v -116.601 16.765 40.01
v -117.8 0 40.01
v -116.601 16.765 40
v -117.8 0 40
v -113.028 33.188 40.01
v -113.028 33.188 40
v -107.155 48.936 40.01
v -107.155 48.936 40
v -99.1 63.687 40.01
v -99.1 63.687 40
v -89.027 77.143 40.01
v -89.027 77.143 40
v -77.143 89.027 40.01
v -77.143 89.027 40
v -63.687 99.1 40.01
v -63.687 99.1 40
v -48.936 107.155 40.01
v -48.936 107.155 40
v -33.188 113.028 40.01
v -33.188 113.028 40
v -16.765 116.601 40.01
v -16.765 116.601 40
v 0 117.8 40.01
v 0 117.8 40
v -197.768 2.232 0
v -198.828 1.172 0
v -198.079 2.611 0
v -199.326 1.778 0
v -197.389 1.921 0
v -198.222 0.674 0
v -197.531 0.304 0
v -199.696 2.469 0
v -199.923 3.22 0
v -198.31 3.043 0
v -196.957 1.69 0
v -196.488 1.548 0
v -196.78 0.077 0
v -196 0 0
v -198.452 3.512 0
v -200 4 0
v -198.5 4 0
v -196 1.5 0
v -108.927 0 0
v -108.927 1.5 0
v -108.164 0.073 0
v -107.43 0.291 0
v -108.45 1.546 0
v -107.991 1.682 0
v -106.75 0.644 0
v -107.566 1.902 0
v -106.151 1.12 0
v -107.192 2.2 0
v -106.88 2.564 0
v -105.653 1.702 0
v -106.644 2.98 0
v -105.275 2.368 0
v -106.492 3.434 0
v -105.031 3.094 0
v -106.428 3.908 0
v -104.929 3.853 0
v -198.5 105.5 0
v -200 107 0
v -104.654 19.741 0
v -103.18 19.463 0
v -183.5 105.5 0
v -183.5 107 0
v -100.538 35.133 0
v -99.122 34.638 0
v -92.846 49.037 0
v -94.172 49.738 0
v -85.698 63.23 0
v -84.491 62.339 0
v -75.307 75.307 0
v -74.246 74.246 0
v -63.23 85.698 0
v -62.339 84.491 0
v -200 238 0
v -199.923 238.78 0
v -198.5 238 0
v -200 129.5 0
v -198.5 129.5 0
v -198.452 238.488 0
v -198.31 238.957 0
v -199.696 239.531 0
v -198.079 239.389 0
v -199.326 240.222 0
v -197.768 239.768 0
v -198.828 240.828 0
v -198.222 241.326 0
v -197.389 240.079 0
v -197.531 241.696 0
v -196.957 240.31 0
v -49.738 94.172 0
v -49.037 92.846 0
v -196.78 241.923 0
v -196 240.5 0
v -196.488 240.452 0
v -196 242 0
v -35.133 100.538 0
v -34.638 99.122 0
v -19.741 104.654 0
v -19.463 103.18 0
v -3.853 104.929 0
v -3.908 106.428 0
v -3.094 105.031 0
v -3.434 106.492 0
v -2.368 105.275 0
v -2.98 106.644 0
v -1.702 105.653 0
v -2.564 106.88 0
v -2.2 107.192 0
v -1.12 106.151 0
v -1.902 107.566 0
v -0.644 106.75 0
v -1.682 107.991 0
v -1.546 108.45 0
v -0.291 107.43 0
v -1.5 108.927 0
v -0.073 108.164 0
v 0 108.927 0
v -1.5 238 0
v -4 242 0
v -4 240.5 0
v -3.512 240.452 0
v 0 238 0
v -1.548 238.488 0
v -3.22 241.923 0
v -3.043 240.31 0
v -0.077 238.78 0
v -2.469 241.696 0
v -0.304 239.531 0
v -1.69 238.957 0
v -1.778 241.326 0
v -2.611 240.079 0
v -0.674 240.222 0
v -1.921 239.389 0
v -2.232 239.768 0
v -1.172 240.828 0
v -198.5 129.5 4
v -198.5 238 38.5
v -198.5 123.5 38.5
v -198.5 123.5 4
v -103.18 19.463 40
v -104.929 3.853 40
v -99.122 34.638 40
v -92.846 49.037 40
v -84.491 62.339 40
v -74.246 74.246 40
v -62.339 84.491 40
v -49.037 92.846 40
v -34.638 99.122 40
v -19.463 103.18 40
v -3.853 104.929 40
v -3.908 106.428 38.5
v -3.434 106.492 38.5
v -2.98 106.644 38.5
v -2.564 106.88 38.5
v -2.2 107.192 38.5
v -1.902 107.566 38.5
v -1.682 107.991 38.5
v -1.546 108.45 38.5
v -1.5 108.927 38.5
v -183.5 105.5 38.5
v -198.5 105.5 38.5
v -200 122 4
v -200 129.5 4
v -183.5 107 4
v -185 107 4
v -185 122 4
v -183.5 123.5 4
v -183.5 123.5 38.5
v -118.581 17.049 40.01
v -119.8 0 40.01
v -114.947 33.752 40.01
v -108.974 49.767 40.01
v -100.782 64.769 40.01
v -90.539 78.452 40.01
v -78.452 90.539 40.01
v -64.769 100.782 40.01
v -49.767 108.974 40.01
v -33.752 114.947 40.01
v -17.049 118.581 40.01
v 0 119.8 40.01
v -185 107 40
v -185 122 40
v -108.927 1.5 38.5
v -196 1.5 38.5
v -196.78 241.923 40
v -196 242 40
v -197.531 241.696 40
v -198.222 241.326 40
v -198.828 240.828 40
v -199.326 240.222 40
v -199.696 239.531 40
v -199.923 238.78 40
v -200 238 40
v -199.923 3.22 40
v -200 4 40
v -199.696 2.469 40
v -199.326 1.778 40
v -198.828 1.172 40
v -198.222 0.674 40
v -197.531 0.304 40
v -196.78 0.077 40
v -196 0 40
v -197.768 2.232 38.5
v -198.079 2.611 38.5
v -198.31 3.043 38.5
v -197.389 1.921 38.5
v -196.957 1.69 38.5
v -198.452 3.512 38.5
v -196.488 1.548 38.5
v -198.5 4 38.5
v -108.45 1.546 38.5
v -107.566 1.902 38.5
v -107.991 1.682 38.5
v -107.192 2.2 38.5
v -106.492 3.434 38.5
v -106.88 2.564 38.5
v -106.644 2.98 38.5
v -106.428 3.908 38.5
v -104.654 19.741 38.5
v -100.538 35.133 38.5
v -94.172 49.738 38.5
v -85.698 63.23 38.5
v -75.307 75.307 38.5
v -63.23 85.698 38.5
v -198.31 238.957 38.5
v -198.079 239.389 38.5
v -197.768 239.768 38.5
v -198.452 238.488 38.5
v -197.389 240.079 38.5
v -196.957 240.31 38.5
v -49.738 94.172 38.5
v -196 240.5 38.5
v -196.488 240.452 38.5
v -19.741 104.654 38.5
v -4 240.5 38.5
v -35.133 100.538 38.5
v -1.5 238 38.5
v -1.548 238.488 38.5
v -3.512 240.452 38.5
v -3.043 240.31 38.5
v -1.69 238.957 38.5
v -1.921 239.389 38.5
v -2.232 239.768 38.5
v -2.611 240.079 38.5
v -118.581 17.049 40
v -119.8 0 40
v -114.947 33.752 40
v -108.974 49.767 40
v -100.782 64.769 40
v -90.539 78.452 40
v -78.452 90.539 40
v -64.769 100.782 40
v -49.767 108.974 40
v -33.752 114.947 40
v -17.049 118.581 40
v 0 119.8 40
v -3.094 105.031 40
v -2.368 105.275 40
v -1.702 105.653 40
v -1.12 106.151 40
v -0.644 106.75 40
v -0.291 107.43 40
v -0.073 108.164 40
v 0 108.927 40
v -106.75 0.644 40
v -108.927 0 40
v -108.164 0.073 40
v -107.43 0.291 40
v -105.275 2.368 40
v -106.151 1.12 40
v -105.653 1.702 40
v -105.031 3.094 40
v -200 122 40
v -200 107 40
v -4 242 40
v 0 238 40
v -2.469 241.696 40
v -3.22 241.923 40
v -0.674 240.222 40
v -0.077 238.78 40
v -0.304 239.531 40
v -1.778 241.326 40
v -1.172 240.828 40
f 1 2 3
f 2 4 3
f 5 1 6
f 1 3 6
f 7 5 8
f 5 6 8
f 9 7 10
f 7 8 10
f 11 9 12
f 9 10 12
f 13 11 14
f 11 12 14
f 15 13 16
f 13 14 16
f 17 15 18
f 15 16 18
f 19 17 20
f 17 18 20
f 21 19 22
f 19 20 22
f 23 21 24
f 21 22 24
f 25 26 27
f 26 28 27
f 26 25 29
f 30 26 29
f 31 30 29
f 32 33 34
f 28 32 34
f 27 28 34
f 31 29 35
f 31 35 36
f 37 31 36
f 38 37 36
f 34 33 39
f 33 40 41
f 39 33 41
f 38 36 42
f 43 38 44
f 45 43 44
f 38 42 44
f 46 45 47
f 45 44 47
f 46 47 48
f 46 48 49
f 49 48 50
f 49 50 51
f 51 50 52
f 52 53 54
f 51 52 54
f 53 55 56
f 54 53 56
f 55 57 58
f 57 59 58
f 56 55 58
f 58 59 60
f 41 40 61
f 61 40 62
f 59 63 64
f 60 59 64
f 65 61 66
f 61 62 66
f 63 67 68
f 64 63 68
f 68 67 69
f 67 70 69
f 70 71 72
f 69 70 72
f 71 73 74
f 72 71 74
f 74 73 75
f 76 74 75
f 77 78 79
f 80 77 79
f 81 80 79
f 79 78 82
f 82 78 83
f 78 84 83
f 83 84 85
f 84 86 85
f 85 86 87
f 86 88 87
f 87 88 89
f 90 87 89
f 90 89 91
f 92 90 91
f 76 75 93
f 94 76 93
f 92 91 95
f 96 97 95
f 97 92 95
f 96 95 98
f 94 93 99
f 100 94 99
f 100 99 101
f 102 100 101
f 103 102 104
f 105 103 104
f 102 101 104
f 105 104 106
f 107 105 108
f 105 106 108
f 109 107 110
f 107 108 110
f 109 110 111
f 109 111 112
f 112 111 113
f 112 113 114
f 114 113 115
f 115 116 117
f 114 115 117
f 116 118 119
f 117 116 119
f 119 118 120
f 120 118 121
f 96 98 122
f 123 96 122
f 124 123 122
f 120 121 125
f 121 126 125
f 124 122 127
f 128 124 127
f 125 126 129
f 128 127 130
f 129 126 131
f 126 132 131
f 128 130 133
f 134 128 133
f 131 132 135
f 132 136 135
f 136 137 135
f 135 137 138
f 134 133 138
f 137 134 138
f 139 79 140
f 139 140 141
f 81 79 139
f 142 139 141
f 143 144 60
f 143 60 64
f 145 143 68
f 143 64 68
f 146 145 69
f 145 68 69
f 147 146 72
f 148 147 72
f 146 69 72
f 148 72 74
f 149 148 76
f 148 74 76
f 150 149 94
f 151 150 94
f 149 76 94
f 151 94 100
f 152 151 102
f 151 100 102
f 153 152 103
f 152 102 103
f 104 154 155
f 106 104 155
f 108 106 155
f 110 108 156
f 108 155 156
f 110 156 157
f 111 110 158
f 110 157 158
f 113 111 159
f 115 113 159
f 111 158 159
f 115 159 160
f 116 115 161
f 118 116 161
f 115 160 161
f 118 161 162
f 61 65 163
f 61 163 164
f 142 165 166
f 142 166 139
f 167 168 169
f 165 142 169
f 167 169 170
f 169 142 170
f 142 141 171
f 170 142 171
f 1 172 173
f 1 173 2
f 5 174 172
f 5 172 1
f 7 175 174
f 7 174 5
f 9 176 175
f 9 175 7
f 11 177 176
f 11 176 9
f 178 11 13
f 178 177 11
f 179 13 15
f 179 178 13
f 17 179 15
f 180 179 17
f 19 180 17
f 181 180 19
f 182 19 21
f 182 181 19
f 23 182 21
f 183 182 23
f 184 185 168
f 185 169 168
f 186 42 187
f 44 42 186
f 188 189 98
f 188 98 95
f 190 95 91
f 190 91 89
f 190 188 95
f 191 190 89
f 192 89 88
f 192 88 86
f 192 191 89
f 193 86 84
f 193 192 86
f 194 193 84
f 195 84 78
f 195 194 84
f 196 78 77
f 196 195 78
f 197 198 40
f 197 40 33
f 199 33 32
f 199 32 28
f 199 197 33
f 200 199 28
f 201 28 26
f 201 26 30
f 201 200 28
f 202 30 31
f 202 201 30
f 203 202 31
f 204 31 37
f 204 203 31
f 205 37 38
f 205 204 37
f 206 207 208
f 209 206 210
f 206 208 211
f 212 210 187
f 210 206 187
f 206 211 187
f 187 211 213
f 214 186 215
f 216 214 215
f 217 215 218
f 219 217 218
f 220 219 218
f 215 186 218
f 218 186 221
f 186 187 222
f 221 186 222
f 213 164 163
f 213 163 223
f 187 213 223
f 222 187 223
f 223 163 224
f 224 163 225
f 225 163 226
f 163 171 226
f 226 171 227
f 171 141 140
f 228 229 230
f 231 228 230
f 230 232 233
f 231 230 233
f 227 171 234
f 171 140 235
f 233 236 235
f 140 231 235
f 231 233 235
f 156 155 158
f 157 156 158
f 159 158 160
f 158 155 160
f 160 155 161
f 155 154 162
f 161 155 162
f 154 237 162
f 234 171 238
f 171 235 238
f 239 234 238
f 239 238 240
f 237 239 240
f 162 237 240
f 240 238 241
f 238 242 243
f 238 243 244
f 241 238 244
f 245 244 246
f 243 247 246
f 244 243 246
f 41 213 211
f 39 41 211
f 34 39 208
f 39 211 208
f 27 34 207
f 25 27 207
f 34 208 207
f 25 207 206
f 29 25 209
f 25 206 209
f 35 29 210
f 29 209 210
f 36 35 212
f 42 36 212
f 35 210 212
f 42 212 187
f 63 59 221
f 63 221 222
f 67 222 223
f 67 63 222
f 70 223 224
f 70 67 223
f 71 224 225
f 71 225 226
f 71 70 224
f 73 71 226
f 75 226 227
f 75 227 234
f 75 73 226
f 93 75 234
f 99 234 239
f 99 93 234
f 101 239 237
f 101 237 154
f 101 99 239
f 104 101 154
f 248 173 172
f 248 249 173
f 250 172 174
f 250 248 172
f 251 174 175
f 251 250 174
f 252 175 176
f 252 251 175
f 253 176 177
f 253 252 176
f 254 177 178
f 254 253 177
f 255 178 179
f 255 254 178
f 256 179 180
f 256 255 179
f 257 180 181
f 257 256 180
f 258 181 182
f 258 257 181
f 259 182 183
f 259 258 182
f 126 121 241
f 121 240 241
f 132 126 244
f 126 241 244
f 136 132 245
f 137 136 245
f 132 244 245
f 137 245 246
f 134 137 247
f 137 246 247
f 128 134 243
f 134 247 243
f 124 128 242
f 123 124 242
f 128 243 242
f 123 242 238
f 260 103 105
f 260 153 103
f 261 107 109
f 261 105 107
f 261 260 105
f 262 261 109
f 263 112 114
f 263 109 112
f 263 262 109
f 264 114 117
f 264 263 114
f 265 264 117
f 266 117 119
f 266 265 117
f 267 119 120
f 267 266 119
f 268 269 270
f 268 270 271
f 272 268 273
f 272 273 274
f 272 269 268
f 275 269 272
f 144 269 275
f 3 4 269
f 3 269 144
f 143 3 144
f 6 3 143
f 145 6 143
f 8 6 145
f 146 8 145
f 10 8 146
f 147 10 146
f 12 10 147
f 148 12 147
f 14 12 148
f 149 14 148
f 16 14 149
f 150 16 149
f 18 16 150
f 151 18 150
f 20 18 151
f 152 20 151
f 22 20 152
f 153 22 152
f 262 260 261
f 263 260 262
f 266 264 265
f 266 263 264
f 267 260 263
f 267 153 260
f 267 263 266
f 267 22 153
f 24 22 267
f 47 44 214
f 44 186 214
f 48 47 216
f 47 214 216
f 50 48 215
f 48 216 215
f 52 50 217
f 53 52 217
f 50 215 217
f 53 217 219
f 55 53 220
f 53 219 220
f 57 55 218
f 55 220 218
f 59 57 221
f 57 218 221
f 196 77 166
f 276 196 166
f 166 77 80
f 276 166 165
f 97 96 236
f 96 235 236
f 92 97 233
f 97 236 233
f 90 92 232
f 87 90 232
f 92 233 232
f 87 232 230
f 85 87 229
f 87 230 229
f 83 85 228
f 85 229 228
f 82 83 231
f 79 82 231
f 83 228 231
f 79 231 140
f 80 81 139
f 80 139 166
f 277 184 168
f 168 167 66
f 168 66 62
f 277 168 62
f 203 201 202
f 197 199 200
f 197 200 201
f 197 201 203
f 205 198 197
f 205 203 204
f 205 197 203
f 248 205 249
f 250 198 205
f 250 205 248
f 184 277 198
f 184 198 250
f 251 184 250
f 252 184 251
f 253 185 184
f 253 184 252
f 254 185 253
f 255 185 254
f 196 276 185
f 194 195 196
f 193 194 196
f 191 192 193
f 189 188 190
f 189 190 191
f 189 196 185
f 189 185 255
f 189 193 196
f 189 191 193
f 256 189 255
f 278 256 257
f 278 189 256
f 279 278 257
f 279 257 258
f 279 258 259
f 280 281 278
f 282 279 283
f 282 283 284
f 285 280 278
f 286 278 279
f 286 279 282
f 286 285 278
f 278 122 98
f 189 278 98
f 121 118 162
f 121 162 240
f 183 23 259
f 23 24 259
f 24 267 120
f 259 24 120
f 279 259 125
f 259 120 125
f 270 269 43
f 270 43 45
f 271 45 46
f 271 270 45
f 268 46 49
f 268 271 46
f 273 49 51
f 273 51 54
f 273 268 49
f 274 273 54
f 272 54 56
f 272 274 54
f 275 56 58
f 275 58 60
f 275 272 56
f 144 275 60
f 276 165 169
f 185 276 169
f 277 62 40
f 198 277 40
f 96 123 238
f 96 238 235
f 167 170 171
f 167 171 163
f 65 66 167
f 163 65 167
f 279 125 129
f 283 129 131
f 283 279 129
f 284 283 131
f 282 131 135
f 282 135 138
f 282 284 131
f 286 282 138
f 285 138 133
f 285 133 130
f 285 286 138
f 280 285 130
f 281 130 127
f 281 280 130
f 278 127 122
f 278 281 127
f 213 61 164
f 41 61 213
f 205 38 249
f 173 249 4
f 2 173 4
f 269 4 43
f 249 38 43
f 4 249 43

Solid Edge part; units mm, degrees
sketch "Sketch1" plane through (0, 0, 0) normal (0, 0, 1) x (1, 0, 0)
  line L0 (0, 105) -> (0, 242)
  line L1 (0, 242) -> (-200, 242)
  line L2 (-200, 242) -> (-200, 122)
  line L3 (-200, 122) -> (-185, 122)
  line L4 (-185, 122) -> (-185, 107)
  line L5 (-185, 107) -> (-200, 107)
  line L6 (-200, 107) -> (-200, 0)
  line L7 (-200, 0) -> (-105, 0)
  arc A0 (-105, 0) -> (0, 105) centre (0, 0) cw
extrude "ProtrusiónExtruida_1" add sketch "Sketch1" along normal blind 40
fillet "Round1" radius 4 5 edges at (-105, 0, 20) (-200, 0, 20) (0, 105, 20) (0, 242, 20) (-200, 242, 20)
shell "Espesor_2" thickness 1.5 removed faces 1 at (-168.6667, 42.7533, 0)
sketch "Sketch2" plane through (-100, 121, 40) normal (0, 0, 1) x (1, 0, 0)
  line L0 (-19.8, -121) -> (-17.8, -121)
  arc A0 (-17.8, -121) -> (100, -3.2) centre (100, -121) cw
  line L1 (100, -3.2) -> (100, -1.2)
  arc A1 (-19.8, -121) -> (100, -1.2) centre (100, -121) cw
extrude "ProtrusiónExtruida_2" add sketch "Sketch2" along normal blind 0.01
sketch "Sketch3" plane through (-100, 121, 0) normal (0, 0, -1) x (-1, 0, 0)
  line L0 (77.5, -14) -> (77.5, 8.5)
  line L1 (77.5, 8.5) -> (100, 8.5)
  line L2 (100, 8.5) -> (100, -14)
  line L3 (100, -14) -> (77.5, -14)
extrude "VaciadoExtruido_1" cut sketch "Sketch3" against normal blind 4
